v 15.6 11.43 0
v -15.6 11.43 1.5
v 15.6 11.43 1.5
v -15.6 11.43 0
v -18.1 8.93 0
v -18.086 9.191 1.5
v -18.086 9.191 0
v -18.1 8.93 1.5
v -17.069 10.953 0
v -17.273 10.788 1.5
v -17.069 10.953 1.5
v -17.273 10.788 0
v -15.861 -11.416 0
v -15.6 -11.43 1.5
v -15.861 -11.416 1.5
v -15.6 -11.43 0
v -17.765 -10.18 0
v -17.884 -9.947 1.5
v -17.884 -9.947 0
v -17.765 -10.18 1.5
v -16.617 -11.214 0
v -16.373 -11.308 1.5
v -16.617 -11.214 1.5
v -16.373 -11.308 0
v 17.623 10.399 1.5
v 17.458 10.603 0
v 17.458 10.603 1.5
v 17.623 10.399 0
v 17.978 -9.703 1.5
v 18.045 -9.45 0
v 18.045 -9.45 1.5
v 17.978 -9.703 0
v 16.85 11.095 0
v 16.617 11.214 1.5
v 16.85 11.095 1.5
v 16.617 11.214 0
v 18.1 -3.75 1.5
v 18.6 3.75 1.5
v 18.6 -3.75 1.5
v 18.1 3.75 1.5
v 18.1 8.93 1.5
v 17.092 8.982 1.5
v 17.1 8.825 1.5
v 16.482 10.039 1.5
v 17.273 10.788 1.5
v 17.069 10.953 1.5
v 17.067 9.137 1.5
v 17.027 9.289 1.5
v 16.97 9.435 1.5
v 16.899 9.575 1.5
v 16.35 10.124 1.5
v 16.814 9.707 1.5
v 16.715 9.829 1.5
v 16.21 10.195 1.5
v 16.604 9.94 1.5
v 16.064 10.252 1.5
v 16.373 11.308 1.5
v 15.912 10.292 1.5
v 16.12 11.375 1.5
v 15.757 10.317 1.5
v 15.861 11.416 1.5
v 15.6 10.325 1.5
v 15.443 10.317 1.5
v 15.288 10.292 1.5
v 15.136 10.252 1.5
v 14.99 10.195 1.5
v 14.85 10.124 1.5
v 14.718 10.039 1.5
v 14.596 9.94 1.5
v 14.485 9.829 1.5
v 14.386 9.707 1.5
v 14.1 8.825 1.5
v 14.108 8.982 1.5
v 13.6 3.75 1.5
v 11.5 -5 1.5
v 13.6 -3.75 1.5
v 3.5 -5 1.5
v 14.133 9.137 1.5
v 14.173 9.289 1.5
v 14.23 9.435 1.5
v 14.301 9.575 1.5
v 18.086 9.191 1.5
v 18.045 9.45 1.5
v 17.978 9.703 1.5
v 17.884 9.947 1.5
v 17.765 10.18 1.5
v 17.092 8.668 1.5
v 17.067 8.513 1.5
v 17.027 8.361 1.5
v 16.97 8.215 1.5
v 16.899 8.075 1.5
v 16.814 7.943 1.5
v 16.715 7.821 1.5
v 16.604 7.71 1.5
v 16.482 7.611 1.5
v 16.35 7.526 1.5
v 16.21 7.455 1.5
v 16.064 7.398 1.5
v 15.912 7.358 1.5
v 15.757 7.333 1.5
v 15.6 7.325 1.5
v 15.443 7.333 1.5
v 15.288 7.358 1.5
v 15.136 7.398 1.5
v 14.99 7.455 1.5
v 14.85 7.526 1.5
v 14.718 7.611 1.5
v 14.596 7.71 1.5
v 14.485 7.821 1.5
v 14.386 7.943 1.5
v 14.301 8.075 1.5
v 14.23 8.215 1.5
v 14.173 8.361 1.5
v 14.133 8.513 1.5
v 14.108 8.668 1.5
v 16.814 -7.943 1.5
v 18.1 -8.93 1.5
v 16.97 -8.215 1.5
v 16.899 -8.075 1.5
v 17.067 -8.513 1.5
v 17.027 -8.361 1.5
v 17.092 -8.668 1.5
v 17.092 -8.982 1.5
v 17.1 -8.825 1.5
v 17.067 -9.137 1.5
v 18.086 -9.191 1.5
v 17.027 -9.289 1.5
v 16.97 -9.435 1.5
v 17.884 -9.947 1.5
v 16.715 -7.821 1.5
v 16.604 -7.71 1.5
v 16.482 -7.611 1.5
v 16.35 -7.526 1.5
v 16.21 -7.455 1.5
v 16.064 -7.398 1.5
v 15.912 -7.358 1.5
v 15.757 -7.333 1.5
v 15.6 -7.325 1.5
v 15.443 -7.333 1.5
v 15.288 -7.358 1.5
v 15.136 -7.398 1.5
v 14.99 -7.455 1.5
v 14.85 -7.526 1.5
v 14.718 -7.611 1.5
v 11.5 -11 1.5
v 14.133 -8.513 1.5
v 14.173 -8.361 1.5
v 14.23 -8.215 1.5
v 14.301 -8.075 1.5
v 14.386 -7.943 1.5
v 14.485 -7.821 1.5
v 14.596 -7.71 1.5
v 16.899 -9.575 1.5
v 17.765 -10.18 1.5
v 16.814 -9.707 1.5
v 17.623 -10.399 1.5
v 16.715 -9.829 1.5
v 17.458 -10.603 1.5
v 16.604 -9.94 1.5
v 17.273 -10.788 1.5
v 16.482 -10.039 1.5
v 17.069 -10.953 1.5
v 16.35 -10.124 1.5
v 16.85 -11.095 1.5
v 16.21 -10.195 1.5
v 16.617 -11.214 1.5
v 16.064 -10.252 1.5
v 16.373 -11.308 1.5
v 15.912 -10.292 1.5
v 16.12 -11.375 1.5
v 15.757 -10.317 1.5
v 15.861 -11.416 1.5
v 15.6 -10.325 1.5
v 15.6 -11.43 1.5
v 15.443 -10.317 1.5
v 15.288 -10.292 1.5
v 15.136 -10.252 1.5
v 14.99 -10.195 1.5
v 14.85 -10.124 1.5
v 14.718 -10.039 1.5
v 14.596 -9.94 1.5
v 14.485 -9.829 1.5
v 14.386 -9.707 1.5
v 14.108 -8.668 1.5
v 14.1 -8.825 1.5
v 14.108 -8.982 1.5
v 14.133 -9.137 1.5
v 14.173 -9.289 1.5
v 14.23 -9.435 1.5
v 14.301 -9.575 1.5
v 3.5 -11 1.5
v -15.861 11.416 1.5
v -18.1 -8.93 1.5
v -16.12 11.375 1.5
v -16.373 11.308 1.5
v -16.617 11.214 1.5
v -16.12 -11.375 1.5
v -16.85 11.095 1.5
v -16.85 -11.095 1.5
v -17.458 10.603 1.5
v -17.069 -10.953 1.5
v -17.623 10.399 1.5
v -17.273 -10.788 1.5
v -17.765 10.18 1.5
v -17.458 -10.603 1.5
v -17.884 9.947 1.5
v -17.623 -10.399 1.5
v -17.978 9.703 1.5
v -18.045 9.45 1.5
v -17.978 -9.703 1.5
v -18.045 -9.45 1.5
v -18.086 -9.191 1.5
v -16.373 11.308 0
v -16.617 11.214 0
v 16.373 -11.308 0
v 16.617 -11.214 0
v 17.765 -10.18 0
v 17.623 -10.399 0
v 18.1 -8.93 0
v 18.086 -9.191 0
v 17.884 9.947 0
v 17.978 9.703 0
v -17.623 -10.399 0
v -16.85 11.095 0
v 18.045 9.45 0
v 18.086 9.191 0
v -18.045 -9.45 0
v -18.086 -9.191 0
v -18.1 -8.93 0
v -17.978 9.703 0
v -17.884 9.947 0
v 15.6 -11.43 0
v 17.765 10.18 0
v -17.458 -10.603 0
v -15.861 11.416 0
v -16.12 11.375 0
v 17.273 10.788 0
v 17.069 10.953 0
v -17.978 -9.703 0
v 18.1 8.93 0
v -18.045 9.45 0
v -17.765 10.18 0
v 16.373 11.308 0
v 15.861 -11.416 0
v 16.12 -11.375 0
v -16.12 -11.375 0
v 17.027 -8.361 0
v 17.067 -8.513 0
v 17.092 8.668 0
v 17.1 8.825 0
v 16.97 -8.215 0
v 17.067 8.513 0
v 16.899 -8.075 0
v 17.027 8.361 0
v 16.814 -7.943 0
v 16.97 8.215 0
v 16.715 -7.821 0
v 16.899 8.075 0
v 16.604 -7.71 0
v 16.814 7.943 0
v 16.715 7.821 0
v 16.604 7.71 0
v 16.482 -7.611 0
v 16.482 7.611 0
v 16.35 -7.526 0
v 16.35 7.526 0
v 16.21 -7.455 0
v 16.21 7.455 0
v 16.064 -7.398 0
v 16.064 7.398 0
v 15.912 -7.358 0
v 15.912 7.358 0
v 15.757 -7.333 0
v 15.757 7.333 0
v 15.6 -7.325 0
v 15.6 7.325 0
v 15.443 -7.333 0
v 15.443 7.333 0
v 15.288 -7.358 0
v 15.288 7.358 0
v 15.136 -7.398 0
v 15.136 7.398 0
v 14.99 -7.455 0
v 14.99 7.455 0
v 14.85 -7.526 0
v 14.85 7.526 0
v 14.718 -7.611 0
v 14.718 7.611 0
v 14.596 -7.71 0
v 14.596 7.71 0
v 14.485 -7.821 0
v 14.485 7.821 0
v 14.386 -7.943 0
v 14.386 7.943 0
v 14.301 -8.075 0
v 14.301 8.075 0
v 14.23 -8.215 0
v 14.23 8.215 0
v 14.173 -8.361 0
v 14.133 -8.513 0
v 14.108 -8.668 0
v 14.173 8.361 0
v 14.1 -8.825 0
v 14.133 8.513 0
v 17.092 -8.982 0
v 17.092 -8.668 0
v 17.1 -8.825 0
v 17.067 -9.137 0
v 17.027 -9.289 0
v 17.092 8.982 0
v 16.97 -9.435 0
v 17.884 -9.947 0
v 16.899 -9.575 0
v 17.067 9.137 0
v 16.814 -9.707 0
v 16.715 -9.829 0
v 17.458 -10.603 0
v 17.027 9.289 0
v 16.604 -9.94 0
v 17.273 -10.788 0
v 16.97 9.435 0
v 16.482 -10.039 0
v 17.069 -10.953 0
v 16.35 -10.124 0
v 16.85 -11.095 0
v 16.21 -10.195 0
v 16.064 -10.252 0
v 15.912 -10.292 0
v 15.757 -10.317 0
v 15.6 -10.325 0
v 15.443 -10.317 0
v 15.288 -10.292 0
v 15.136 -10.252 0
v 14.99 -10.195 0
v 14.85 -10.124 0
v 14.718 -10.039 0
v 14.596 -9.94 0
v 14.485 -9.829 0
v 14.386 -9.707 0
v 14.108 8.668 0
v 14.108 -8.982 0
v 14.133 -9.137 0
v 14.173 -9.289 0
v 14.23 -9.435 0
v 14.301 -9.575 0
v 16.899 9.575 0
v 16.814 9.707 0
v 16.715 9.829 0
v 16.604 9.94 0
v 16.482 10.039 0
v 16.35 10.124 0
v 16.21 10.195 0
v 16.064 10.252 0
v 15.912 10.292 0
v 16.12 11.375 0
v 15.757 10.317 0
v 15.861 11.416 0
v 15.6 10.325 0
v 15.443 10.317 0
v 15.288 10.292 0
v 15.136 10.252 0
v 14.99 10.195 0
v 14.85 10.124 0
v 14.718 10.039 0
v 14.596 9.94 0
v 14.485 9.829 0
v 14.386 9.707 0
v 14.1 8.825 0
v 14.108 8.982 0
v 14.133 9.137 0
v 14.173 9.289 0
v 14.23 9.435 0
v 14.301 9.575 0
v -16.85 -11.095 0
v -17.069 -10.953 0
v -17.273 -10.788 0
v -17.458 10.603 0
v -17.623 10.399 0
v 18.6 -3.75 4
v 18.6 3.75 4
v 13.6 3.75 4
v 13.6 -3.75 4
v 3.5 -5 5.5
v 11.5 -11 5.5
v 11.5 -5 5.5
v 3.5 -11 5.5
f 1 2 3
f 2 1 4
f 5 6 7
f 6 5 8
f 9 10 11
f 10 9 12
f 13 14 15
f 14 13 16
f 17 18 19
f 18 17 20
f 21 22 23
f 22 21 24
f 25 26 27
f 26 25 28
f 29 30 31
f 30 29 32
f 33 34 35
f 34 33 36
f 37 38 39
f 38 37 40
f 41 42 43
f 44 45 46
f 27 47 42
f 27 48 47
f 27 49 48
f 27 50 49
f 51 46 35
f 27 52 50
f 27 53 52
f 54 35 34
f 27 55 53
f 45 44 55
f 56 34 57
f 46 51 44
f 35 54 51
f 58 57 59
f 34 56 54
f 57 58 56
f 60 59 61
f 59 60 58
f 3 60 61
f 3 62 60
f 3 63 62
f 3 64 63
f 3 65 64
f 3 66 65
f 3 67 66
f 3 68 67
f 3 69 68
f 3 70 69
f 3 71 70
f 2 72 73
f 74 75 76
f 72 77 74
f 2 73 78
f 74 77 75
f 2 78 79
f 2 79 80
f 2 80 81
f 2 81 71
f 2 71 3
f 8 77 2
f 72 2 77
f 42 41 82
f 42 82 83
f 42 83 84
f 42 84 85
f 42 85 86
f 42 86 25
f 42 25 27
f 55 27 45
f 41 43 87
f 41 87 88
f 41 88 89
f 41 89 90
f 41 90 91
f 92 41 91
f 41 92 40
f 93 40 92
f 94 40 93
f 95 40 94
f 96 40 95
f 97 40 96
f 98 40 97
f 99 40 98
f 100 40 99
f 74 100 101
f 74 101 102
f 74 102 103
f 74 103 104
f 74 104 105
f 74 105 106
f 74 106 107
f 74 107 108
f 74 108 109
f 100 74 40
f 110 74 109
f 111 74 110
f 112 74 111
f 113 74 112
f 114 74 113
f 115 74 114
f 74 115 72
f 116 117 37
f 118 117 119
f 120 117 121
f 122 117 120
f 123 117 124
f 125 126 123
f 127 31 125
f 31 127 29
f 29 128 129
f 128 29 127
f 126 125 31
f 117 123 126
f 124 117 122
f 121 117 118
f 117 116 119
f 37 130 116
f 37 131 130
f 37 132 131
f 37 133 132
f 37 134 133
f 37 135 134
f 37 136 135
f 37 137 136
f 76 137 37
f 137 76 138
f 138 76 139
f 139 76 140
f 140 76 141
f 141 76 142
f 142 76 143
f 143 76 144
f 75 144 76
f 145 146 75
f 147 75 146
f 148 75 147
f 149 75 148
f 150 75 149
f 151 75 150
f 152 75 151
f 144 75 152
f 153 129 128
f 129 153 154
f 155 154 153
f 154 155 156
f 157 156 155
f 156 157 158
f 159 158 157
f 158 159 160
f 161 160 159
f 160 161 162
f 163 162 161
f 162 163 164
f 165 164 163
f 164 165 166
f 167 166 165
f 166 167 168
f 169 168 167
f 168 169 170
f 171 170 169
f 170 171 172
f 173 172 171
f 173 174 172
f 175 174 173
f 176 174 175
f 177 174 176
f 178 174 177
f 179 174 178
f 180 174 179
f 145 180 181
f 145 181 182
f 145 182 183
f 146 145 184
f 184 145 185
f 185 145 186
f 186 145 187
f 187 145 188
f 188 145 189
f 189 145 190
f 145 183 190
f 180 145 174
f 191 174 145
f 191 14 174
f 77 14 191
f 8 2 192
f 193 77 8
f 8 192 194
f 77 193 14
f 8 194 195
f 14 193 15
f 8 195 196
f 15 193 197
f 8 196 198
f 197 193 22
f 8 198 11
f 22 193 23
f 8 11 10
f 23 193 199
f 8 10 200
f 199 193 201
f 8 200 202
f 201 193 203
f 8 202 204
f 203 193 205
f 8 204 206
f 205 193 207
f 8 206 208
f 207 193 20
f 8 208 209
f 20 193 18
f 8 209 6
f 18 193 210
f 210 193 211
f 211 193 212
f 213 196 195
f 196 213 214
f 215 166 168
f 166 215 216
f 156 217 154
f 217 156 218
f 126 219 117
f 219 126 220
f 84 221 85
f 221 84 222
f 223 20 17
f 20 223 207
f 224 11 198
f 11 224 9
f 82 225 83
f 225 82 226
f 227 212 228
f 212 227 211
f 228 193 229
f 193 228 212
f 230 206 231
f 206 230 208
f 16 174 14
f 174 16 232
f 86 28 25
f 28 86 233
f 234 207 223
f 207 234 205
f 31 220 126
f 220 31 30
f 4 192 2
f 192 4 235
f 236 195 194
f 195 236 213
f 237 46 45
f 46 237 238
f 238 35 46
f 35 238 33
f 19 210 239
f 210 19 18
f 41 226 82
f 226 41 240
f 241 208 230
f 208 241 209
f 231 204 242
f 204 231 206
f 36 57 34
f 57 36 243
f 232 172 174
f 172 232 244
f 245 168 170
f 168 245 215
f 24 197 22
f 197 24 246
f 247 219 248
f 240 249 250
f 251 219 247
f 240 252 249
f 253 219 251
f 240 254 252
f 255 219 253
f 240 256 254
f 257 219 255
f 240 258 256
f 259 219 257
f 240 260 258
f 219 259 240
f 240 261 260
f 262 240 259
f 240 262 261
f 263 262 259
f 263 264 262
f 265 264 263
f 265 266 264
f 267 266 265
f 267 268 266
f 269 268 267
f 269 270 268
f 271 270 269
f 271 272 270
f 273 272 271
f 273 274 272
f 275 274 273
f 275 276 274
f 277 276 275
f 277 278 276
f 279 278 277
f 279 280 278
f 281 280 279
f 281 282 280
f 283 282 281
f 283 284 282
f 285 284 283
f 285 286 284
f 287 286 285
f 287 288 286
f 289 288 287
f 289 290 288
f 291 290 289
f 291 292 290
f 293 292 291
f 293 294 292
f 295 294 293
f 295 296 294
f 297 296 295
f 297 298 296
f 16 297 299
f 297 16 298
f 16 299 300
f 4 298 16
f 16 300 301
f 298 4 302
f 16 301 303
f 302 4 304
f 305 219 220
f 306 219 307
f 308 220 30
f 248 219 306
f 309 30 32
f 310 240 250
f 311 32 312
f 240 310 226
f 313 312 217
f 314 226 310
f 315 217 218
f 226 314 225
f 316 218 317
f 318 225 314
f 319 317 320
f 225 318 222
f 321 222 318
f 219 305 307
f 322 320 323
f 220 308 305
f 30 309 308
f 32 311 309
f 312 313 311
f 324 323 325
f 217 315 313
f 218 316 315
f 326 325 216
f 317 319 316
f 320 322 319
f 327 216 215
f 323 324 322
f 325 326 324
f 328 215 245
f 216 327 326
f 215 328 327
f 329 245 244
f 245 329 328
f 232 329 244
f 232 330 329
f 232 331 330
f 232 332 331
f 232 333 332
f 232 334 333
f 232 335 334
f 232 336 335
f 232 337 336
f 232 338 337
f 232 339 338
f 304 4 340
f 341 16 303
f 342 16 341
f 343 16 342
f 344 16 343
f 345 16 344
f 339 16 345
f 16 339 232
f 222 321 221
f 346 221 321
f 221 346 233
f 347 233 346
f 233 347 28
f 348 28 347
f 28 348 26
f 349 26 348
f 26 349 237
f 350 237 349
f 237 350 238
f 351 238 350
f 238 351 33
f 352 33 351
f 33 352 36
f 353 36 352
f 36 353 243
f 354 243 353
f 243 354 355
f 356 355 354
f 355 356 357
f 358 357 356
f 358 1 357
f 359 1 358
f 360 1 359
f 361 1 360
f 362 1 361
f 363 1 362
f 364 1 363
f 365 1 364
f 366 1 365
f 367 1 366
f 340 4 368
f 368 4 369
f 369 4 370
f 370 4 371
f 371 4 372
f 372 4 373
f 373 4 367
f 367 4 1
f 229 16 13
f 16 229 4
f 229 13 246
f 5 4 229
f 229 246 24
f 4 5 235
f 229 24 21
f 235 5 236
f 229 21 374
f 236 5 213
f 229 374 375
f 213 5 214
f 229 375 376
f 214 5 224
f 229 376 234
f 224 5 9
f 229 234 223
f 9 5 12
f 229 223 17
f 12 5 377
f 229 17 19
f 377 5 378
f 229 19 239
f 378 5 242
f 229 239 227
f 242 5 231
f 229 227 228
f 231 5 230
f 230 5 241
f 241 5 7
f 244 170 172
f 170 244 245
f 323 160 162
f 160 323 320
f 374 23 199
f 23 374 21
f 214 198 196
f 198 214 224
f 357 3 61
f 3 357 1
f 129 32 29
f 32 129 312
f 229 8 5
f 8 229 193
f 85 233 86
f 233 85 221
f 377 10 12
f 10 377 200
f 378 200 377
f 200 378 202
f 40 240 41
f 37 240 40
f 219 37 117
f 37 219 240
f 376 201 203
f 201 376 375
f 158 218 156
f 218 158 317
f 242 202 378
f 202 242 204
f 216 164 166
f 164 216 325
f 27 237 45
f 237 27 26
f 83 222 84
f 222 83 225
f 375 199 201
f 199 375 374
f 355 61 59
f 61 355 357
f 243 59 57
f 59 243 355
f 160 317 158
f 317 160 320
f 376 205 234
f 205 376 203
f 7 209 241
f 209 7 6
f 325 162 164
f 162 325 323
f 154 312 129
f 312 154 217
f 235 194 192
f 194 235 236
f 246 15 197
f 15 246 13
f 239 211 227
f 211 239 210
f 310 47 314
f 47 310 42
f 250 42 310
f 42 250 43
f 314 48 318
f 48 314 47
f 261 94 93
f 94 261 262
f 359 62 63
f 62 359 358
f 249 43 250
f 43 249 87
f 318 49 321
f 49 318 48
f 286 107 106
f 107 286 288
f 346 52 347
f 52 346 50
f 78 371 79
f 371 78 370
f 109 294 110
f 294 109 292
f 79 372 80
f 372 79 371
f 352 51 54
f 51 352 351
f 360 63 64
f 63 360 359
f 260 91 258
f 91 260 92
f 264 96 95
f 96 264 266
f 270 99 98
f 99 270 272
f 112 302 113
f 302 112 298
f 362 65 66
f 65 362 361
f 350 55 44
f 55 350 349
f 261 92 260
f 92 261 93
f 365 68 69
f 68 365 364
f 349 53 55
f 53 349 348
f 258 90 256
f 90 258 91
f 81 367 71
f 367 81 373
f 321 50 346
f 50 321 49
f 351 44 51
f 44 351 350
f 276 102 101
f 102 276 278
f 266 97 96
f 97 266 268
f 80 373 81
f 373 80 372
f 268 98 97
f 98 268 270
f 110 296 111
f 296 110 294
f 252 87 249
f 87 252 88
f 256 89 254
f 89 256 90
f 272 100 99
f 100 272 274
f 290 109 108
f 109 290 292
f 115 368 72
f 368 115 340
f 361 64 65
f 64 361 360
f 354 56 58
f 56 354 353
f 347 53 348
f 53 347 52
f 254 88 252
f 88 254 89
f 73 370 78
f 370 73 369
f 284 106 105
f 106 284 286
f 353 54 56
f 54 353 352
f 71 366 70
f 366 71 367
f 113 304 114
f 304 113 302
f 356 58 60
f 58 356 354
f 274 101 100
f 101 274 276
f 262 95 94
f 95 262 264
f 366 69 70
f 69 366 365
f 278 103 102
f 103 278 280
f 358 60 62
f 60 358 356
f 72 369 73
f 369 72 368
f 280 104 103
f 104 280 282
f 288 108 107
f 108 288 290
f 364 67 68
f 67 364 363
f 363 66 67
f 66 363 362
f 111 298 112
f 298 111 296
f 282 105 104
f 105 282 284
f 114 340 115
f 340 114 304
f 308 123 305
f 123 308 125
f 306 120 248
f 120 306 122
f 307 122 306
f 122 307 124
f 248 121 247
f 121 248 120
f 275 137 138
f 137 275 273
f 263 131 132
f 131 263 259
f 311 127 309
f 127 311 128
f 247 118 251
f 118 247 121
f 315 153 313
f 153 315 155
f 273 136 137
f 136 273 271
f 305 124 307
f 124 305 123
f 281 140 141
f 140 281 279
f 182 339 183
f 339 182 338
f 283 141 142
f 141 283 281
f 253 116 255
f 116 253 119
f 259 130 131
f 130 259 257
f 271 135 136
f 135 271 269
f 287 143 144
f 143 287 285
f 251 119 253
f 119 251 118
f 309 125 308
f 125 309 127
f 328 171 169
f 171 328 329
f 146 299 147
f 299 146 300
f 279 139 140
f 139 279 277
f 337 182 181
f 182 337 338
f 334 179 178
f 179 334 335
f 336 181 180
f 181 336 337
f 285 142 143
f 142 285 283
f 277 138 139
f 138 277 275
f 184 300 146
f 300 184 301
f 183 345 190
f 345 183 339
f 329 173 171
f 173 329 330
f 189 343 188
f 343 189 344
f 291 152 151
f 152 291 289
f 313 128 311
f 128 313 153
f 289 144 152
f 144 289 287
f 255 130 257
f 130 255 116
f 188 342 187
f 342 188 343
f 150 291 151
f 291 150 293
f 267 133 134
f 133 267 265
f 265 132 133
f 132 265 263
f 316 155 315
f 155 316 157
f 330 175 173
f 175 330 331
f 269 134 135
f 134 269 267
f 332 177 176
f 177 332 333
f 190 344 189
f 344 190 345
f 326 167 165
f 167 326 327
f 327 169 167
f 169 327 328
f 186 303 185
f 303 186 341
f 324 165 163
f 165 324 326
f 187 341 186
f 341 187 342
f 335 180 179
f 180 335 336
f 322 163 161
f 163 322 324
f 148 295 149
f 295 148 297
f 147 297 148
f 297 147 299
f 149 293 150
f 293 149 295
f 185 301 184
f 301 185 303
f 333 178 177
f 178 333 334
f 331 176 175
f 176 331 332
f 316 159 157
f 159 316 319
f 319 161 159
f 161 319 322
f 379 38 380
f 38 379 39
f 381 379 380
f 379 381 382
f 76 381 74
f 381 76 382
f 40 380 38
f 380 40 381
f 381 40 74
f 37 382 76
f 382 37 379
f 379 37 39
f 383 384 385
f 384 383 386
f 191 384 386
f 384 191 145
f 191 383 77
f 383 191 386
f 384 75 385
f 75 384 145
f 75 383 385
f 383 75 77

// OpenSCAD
// file: include/pcb.scad
// Modules and constants for mocking up printed circuit boards

// Conventions:
// -- the long side is x, narrow side is y
// -- the bottom of the board is at z=0

// Header base
hdr_base_x = 2.5;
hdr_base_y = 2.5;
hdr_base_z = 2.5;

// Header pin
hdr_pin_x = 0.7;
hdr_pin_y = 0.7;
hdr_pin_z = 11.75;

// Common components, spec: [x size, y size, z size, color]
micro_usb = [5.0, 7.5, 2.5, "silver"];
jst2 = [6.0, 8.0, 4.0, "white"];
hdmi = [7.25, 11.25, 3.3, "Silver"];
sd_card_holder = [12.0, 11.5, 1.3, "Silver"];

// Printed circuit board with rounded corners
module pcb(x, y, board_h = 1.5, r = 2.5) {
  x_pos = x / 2 - r;
  y_pos = y / 2 - r;

  hull() for (i = [- x_pos, x_pos], j = [- y_pos, y_pos]) {
    translate([i, j, 0]) cylinder(r = r, h = board_h);
  }
}

// Hole in the pcb
module pcb_hole(x, y, r, board_h = 1.5) {
  translate([x, y, - 0.1]) cylinder(h = board_h + 0.2, r = r);
}

// Component that sits on top of the pcb
module pcb_component(spec, x, y, yaw = 0.0, board_h = 1.5) {
  color(spec[3])
    translate([x, y, board_h + spec[2] / 2])
      rotate([0, 0, yaw])
        cube([spec[0], spec[1], spec[2]], center = true);
}

// Header (base + pin)
module pcb_header(x, y, base_z, pin_z) {
  color("Black")
    translate([x, y, base_z])
      cube([hdr_base_x, hdr_base_y, hdr_base_z], center = true);
  color("Silver")
    translate([x, y, pin_z])
      cube([hdr_pin_x, hdr_pin_y, hdr_pin_z], center = true);
}
// file: include/adafruit.scad
include <pcb.scad>

// Adafruit Powerboost 1000 Charger
// https://www.adafruit.com/product/2465
module power_boost() {
  hole_x = 36.2 / 2 - 2.5;
  hole_y = 17.65 / 2;

  color("#0232c3") difference() {
    pcb(36.2, 22.86);
    pcb_hole(hole_x, hole_y, 1.5);
    pcb_hole(hole_x, - hole_y, 1.5);
  }

  pcb_component(micro_usb, 36.2 / 2 - 2, 0);
  pcb_component(jst2, 7.5, - 8, 90);
}

// Adafruit Lithium Ion Cylindrical Battery - 3.7v 2200mAh
// https://www.adafruit.com/product/1781
module battery() {
  color("#5252b4") cylinder(h = 69, r = 9);
}
// main file
include <include/adafruit.scad>

// Hi-def render
$fn = 60;

power_boost();
